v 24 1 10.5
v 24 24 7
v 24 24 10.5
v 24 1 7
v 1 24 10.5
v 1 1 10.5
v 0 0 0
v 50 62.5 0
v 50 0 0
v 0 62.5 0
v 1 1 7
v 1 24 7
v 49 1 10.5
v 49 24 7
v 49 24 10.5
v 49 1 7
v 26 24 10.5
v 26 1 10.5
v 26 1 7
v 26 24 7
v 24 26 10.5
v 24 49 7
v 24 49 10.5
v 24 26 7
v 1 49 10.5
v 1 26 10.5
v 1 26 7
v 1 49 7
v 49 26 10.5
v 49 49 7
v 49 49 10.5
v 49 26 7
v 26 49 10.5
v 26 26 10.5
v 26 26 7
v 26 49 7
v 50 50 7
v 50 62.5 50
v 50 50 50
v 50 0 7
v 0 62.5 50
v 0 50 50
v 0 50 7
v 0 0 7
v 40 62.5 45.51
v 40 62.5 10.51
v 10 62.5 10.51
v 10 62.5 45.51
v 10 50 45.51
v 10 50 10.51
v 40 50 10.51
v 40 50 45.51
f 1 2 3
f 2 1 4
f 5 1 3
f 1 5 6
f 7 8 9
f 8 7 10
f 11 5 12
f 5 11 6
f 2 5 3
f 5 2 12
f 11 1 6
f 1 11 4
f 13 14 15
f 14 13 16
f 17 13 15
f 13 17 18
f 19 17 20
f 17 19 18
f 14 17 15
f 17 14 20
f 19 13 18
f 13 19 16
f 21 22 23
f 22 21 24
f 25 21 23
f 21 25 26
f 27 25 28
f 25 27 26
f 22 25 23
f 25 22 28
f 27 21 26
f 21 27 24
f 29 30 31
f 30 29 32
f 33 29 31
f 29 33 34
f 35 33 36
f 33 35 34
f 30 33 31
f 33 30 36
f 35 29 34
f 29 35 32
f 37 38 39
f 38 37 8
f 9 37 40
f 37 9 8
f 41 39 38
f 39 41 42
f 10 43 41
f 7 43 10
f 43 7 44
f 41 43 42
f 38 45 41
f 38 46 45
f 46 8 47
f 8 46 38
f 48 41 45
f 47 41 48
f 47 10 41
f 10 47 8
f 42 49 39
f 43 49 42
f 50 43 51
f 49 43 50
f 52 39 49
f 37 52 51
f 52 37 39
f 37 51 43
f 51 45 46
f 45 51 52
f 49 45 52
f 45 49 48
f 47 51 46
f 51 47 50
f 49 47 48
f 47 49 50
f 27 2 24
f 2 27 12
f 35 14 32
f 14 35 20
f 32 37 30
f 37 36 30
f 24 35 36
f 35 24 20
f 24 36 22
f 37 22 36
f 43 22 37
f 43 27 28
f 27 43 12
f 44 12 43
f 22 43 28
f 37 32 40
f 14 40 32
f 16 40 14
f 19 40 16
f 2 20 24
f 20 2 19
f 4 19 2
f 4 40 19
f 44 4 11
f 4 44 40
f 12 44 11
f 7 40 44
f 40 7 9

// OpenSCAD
color("LightGray") {
    translate([1,1,0]) cube([23,23,6+4.5]);
    translate([25+1,1,0]) cube([23,23,6+4.5]);
    translate([1,25+1,0]) cube([23,23,6+4.5]);
    translate([25+1,25+1,0]) cube([23,23,6+4.5]);
}
color("Grey") {
    cube([50,50,6+1]);
    difference() {
        translate([0,50,0]) cube([50,12.5,50]);
        translate([10,25,6+4.51]) cube([30,50,35]);
    }
}
